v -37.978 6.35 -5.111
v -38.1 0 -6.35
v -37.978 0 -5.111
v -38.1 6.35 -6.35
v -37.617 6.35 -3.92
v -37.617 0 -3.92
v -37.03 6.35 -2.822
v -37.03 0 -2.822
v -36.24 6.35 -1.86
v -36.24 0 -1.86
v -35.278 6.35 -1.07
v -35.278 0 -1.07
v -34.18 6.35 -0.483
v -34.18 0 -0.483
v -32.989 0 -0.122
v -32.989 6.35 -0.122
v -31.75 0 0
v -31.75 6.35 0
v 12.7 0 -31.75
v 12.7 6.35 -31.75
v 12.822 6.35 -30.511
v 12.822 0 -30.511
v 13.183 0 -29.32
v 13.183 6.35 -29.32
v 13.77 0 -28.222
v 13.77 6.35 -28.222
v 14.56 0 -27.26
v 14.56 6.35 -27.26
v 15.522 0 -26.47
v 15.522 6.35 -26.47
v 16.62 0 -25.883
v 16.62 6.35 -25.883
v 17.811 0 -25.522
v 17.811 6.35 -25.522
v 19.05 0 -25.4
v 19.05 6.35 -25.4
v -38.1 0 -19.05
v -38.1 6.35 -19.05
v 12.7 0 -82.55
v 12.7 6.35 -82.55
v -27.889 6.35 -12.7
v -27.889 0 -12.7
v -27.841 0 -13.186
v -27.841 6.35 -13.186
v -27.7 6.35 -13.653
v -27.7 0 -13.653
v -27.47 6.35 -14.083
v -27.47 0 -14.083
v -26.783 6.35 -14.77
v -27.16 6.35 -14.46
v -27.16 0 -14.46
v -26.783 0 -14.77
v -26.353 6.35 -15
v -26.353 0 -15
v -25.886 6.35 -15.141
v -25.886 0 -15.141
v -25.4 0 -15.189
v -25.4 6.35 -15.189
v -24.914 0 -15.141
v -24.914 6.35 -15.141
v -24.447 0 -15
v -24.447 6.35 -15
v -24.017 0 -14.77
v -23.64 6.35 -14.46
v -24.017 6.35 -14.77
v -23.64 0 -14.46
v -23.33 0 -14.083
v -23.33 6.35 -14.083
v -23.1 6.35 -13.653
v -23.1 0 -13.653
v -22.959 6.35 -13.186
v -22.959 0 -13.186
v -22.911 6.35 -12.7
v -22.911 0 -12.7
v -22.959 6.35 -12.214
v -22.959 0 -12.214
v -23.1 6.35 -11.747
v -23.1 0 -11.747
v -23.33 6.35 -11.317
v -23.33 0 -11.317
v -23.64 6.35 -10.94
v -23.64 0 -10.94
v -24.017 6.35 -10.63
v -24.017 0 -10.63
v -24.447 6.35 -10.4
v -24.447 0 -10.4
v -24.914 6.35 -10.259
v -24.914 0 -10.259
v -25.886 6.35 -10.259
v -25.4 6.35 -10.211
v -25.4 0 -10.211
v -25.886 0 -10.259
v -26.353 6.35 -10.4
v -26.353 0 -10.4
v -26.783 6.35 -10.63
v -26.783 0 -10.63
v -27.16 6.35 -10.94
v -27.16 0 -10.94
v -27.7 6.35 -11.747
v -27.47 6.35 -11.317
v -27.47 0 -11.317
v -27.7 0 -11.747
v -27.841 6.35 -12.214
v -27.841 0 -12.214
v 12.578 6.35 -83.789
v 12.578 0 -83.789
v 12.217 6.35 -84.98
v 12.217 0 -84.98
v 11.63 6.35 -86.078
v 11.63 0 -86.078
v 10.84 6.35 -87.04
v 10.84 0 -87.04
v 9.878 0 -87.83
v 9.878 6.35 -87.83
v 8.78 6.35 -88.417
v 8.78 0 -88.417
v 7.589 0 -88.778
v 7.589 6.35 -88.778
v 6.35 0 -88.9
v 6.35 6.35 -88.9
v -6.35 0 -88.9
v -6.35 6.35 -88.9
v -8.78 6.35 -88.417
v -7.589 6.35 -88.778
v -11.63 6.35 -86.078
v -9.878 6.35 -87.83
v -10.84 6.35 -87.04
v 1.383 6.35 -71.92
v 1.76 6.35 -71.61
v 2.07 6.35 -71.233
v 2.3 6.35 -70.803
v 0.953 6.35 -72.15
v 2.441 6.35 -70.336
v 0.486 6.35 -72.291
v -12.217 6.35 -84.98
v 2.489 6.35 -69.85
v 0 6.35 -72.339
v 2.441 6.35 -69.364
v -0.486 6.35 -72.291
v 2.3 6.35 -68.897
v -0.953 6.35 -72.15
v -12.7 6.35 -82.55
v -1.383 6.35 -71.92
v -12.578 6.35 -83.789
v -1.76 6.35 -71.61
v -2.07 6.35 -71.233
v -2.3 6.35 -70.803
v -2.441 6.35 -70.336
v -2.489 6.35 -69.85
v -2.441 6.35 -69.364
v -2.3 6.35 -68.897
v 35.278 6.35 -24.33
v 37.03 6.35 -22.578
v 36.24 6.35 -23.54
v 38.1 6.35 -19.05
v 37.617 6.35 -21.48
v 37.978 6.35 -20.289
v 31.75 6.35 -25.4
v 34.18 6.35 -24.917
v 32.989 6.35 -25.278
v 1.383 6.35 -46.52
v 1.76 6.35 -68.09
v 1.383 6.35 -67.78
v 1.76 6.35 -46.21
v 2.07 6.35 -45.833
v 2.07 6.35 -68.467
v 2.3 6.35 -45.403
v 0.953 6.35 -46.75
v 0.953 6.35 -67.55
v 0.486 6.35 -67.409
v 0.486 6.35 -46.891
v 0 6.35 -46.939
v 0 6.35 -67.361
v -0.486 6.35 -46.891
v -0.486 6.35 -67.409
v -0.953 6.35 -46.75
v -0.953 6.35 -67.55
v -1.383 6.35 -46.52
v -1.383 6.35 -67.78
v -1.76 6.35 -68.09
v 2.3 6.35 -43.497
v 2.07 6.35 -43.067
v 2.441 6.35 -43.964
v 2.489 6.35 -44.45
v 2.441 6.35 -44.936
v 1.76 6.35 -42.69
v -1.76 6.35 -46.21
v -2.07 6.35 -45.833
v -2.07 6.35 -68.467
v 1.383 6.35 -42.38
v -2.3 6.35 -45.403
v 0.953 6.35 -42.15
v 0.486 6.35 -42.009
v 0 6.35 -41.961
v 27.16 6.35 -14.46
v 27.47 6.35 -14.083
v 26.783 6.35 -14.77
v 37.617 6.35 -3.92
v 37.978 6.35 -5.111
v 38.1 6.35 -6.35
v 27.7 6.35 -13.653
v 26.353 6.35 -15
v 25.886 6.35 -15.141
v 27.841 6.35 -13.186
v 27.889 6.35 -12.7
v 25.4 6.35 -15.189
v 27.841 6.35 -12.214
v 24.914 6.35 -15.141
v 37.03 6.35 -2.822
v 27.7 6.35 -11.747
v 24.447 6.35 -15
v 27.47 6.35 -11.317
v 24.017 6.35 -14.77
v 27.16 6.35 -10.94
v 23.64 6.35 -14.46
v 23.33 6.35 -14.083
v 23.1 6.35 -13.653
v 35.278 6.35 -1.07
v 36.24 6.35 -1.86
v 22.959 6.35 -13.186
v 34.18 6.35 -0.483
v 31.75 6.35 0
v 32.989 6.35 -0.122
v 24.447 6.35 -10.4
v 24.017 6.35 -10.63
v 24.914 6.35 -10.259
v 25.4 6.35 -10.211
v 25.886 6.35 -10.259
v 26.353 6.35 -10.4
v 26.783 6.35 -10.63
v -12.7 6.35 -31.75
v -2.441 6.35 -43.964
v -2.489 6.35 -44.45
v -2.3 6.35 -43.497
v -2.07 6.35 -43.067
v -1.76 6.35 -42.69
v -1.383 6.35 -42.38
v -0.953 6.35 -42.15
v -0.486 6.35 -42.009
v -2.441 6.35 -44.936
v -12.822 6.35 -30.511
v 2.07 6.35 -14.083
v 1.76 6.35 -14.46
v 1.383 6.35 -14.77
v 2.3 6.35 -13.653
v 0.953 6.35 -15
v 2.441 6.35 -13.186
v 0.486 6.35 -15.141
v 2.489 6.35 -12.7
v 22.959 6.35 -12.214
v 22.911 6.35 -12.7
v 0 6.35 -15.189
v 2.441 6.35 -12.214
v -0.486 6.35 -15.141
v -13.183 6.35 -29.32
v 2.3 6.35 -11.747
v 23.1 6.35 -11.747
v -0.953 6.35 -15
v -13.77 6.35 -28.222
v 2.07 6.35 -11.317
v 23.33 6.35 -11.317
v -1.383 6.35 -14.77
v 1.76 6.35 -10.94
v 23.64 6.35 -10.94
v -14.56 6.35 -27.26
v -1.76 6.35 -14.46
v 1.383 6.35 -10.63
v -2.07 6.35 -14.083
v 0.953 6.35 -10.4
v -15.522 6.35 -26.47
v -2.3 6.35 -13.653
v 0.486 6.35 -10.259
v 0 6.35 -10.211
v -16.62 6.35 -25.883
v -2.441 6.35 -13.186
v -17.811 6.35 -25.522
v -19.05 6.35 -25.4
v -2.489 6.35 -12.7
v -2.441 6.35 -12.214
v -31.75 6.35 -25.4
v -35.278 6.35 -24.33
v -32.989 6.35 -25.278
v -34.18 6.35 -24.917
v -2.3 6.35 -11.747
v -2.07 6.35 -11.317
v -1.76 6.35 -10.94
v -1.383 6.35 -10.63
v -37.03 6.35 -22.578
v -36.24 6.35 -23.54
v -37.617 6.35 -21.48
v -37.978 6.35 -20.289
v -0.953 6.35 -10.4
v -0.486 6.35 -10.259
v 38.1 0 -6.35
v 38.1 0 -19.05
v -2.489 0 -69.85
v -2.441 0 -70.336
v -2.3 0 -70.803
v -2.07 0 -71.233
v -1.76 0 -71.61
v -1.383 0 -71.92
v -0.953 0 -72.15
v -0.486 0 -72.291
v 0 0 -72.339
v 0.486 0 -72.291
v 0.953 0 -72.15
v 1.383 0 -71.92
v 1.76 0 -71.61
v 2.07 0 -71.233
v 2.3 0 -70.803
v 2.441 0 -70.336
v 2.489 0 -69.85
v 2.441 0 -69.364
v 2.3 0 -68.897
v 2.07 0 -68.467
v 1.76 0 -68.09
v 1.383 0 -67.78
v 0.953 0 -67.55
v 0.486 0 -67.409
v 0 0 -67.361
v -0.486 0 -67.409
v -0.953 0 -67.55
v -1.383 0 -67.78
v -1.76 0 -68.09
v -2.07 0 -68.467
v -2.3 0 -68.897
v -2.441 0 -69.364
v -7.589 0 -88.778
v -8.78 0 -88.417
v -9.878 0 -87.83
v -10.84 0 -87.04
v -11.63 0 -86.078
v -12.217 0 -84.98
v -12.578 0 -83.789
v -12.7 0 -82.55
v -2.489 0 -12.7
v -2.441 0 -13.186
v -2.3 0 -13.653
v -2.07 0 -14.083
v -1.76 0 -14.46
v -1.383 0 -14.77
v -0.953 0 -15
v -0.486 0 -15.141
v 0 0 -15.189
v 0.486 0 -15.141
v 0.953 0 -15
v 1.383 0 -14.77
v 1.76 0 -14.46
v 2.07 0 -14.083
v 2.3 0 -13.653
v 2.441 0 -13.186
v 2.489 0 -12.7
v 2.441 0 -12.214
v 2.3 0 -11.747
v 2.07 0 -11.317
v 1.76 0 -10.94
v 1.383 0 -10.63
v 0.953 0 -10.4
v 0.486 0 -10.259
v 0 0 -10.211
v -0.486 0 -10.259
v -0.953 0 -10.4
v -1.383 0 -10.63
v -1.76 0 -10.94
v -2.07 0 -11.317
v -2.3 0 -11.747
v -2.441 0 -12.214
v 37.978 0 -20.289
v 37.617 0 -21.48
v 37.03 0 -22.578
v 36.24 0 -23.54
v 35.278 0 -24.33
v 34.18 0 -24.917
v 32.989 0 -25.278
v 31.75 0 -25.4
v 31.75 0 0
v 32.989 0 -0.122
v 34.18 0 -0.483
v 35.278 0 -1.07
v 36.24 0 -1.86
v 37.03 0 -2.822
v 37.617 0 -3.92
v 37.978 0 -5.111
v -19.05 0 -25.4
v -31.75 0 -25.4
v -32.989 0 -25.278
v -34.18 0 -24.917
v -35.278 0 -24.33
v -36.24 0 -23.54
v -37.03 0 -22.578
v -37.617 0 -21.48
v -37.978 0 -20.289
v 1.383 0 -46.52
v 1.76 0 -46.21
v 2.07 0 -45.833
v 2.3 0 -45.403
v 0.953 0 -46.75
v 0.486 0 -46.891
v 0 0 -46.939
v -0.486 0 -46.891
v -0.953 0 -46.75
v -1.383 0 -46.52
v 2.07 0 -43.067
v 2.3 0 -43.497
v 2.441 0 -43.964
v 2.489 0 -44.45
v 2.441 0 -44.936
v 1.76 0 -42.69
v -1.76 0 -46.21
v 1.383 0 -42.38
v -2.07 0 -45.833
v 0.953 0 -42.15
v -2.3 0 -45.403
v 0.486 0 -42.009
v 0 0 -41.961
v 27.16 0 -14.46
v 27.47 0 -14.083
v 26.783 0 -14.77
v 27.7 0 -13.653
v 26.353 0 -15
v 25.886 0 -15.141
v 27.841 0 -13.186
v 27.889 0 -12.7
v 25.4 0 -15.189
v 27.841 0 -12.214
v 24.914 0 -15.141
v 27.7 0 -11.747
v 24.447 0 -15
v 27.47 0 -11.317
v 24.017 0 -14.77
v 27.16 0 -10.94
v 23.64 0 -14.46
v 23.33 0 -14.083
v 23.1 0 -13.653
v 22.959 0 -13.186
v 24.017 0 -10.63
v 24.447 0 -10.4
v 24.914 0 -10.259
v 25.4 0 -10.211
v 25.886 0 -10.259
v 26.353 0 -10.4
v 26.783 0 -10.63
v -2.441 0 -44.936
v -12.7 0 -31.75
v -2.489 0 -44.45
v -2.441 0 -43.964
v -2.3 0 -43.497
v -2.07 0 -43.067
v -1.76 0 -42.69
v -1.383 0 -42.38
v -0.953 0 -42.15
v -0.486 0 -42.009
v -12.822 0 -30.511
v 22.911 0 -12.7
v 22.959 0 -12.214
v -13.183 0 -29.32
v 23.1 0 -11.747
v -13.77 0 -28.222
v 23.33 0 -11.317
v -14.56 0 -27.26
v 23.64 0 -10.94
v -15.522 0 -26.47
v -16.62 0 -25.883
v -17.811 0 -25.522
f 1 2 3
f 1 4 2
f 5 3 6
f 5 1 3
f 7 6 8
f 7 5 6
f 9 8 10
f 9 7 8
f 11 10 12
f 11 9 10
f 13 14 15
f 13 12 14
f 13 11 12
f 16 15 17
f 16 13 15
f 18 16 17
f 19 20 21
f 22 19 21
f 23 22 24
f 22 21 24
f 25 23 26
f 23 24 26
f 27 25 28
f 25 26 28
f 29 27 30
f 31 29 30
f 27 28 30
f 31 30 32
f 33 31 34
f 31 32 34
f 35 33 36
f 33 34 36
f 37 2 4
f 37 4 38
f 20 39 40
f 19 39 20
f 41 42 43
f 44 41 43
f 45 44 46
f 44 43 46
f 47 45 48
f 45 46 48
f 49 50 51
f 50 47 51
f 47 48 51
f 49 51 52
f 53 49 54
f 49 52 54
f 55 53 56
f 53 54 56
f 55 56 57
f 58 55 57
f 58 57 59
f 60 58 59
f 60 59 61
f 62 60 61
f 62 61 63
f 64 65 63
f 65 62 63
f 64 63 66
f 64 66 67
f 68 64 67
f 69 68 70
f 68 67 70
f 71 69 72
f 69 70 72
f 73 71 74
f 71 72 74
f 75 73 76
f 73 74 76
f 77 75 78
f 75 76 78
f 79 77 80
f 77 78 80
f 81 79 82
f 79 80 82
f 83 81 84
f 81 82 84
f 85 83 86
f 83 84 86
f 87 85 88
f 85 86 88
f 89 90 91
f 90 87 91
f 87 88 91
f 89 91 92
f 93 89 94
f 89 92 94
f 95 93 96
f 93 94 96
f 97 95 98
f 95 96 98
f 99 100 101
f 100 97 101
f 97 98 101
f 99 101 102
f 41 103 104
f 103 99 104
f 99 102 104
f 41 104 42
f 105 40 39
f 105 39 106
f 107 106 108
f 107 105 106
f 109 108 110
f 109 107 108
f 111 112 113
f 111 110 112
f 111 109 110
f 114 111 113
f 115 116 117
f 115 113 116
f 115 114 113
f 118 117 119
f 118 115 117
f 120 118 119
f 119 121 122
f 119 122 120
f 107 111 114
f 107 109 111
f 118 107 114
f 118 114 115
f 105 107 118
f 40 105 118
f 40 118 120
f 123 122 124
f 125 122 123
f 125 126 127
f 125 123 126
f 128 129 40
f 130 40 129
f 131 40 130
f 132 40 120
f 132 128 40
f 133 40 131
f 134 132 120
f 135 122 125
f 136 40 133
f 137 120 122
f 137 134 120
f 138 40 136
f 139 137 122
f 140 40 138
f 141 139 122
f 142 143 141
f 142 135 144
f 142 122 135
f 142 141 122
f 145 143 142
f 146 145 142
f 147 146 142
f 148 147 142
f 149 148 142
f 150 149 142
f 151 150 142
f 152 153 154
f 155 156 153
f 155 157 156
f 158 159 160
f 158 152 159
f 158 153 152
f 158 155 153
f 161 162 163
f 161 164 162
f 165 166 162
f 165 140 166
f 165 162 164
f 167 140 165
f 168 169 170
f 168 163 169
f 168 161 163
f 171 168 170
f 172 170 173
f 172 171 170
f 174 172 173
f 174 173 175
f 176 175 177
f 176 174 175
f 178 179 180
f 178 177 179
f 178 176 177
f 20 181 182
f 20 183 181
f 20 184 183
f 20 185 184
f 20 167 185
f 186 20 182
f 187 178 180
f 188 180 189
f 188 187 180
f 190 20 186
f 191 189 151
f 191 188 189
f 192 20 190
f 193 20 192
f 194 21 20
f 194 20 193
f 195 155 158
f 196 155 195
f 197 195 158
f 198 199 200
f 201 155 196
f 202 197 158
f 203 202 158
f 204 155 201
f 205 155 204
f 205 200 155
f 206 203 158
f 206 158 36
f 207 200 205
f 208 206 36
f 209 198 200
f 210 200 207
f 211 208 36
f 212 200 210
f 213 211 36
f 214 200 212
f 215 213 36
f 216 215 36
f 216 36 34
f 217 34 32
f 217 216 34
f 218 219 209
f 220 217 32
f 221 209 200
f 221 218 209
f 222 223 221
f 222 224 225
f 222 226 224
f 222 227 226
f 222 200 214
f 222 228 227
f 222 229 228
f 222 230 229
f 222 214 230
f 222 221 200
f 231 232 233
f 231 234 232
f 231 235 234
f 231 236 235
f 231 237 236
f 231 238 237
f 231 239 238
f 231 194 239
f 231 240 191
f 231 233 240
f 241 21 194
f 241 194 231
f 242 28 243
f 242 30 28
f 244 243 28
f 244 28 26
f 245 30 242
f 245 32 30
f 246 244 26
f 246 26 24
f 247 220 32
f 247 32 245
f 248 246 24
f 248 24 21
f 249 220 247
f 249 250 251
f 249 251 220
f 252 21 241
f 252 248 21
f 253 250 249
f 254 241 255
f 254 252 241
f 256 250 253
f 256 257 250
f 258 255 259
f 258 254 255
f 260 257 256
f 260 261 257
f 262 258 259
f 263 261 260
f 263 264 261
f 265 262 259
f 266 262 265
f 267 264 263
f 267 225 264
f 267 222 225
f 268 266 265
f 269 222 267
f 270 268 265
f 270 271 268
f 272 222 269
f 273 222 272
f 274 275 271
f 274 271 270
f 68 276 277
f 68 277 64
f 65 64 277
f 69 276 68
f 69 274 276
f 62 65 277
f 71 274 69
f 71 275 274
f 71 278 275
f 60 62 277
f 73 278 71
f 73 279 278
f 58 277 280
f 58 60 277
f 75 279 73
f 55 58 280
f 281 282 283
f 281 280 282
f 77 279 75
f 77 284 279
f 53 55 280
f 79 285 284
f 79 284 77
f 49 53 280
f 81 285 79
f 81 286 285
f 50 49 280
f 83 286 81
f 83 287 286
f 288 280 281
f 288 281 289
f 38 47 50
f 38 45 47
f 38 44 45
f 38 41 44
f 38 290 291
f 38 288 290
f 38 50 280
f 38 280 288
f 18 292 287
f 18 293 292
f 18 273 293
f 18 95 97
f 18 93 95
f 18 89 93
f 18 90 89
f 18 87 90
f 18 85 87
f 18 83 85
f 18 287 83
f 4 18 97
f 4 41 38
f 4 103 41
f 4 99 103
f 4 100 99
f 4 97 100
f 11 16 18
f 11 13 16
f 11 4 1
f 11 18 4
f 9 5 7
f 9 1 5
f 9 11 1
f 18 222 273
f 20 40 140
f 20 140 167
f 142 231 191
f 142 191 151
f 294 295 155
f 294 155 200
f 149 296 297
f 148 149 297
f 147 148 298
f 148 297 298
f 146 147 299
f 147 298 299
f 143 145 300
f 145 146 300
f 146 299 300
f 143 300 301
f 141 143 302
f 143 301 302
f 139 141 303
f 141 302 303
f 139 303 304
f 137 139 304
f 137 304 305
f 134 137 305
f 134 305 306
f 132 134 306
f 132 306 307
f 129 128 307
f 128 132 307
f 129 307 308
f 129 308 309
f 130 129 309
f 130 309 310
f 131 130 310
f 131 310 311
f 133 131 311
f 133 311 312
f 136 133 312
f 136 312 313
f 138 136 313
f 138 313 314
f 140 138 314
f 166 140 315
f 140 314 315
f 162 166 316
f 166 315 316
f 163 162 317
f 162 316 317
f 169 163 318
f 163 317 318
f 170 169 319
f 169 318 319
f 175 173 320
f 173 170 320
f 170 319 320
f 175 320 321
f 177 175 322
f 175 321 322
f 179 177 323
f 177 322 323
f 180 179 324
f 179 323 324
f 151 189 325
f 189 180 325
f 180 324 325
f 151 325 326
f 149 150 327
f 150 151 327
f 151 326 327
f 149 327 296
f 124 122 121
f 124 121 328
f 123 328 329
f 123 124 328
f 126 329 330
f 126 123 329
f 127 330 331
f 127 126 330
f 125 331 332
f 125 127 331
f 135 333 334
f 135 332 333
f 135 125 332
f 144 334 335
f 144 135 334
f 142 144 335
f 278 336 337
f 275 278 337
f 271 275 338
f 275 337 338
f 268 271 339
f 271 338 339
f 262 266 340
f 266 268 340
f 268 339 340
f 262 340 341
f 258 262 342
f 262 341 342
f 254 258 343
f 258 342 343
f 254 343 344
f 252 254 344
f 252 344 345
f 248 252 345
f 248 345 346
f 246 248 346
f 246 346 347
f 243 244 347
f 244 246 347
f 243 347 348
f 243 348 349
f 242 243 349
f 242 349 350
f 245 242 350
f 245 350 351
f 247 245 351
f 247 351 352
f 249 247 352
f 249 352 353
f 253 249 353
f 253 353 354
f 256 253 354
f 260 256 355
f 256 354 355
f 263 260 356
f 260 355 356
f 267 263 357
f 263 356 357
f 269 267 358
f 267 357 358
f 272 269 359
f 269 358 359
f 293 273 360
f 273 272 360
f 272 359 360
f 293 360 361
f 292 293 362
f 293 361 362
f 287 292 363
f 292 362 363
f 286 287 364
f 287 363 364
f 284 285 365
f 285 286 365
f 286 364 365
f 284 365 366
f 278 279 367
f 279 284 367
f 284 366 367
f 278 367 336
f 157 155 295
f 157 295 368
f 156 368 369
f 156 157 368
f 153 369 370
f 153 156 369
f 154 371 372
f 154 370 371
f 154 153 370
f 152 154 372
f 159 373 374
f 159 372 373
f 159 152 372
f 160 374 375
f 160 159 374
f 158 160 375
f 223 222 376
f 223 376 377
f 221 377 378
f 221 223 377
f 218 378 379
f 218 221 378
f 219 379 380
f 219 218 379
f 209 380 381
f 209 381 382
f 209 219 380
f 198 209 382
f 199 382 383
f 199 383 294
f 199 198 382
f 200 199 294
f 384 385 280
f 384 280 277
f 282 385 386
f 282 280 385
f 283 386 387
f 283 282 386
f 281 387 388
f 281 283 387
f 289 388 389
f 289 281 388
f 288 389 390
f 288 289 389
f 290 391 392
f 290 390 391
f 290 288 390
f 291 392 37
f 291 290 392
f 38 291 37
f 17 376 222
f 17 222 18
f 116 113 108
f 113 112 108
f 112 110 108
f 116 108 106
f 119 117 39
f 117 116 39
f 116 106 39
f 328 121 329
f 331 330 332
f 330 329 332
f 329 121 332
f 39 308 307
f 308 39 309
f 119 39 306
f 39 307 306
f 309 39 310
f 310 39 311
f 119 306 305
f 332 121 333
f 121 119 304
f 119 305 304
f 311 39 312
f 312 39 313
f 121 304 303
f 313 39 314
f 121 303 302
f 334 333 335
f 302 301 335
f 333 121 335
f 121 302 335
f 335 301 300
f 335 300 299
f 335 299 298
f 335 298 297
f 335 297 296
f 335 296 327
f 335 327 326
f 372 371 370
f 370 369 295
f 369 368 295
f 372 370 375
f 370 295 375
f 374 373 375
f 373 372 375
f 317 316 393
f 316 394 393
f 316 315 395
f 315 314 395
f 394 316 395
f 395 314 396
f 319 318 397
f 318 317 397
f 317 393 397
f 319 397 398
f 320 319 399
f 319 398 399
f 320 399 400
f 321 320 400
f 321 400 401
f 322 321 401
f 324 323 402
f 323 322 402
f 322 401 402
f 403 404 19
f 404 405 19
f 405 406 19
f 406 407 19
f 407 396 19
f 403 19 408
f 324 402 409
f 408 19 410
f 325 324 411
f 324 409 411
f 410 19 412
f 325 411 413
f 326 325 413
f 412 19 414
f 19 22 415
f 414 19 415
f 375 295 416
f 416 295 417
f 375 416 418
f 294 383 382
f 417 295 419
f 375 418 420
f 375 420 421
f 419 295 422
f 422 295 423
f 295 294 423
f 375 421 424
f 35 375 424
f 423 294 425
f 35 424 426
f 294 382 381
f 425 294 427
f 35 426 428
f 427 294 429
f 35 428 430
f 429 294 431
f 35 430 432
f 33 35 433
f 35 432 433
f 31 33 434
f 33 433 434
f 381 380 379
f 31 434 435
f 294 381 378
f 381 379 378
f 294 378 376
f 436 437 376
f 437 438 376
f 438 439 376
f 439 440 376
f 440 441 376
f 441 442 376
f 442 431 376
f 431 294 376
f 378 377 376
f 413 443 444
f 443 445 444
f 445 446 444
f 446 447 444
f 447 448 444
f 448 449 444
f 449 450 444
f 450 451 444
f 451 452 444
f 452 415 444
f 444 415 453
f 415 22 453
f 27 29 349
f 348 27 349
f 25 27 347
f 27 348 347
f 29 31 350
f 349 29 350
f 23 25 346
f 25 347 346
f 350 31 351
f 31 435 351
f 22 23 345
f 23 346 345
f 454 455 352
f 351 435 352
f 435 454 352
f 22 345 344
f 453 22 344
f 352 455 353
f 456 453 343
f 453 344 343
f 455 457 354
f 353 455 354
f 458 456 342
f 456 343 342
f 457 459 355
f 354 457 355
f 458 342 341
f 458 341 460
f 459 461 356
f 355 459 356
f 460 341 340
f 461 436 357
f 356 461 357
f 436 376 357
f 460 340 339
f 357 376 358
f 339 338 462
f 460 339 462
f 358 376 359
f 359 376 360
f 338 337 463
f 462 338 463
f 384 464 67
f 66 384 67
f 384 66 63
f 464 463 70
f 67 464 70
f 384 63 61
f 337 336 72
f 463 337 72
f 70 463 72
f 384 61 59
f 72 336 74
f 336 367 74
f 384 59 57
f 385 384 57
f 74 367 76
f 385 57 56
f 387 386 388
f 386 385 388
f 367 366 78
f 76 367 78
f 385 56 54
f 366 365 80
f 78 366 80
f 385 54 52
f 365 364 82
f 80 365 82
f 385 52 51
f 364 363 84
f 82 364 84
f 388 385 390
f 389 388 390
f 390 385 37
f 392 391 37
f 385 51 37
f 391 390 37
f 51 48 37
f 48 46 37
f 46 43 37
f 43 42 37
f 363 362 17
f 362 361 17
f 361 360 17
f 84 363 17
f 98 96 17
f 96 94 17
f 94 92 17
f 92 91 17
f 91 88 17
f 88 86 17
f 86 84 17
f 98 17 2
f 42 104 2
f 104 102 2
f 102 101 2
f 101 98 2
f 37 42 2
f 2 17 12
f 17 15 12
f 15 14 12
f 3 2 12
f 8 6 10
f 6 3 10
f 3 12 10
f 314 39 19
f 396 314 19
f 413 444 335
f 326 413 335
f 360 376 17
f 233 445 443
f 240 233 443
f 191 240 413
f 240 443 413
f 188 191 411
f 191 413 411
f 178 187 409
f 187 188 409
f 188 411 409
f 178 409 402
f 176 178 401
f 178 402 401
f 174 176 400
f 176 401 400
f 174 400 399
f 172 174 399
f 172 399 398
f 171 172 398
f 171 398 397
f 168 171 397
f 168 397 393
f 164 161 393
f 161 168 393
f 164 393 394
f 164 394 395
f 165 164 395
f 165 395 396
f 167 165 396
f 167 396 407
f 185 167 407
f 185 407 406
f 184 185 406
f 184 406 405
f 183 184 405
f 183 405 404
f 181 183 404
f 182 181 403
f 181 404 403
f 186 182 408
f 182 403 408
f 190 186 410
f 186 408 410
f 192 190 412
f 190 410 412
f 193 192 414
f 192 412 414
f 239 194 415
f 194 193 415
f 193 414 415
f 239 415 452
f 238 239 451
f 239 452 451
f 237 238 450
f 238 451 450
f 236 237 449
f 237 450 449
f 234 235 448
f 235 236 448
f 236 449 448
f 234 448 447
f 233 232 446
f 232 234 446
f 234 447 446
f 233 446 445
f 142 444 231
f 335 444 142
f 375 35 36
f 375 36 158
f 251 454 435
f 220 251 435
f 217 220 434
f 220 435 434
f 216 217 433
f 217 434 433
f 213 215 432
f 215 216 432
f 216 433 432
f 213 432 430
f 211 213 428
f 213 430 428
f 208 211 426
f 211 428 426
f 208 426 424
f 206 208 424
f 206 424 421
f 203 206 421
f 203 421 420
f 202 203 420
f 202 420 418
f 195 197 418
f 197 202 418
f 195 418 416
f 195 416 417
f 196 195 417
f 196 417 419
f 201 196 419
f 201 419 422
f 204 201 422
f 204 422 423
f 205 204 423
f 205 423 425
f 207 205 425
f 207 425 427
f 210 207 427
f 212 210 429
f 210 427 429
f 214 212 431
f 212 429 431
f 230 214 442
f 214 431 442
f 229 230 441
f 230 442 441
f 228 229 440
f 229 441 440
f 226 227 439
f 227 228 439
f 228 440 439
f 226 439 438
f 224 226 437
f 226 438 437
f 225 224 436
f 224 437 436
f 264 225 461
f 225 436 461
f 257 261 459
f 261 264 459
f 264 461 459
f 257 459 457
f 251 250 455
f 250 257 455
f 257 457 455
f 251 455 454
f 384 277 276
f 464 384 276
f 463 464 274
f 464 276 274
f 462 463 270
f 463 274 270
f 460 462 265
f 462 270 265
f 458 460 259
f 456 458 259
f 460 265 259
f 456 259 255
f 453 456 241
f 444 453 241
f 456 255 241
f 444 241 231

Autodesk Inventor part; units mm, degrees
ref_plane "YZ Plane" through (0, 0, 0) normal (1, 0, 0) x (0, 1, 0)
ref_plane "XZ Plane" through (0, 0, 0) normal (0, 1, 0) x (-1, 0, 0)
ref_plane "XY Plane" through (0, 0, 0) normal (0, 0, 1) x (1, 0, 0)
sketch "Sketch1" plane through (0, 0, 0) normal (0, 1, 0) x (-1, 0, 0)
  line L0 (-38.1, 0) -> (38.1, 0)
  line L1 (38.1, 0) -> (38.1, -25.4)
  line L2 (38.1, -25.4) -> (12.7, -25.4)
  line L3 (12.7, -25.4) -> (12.7, -88.9)
  line L4 (12.7, -88.9) -> (-12.7, -88.9)
  line L5 (-12.7, -88.9) -> (-12.7, -25.4)
  line L6 (-12.7, -25.4) -> (-38.1, -25.4)
  line L7 (-38.1, -25.4) -> (-38.1, 0)
  circle A0 centre (0, -12.7) radius 2.4892
  circle A1 centre (25.4, -12.7) radius 2.4892
  line L8 (0, 0) -> (0, -88.9) construction
  circle A2 centre (-25.4, -12.7) radius 2.4892
  circle A3 centre (0, -44.45) radius 2.4892
  circle A4 centre (0, -69.85) radius 2.4892
  point P0 (38.1, -12.7)
  point P1 (0, -44.45)
  dimension "d0" = 76.2
  dimension "d1" = 25.4
  dimension "d2" = 25.4
  dimension "d3" = 63.5
  dimension "d4" = 4.9784
  dimension "d5" = 25.4
  dimension "d6" = 31.75
  dimension "d7" = 25.4
extrude "Extrusion1" add sketch "Sketch1" along normal blind 6.35
fillet "Fillet1" radius 6.35 8 edges at (-38.1, 3.175, 0) (-38.1, 3.175, -25.4) (-12.7, 3.175, -25.4) (-12.7, 3.175, -88.9) (12.7, 3.175, -88.9) (12.7, 3.175, -25.4) (38.1, 3.175, -25.4) (38.1, 3.175, 0)
properties part number "STRU_020_DVBSBracket1" material "Aluminum 6061"
